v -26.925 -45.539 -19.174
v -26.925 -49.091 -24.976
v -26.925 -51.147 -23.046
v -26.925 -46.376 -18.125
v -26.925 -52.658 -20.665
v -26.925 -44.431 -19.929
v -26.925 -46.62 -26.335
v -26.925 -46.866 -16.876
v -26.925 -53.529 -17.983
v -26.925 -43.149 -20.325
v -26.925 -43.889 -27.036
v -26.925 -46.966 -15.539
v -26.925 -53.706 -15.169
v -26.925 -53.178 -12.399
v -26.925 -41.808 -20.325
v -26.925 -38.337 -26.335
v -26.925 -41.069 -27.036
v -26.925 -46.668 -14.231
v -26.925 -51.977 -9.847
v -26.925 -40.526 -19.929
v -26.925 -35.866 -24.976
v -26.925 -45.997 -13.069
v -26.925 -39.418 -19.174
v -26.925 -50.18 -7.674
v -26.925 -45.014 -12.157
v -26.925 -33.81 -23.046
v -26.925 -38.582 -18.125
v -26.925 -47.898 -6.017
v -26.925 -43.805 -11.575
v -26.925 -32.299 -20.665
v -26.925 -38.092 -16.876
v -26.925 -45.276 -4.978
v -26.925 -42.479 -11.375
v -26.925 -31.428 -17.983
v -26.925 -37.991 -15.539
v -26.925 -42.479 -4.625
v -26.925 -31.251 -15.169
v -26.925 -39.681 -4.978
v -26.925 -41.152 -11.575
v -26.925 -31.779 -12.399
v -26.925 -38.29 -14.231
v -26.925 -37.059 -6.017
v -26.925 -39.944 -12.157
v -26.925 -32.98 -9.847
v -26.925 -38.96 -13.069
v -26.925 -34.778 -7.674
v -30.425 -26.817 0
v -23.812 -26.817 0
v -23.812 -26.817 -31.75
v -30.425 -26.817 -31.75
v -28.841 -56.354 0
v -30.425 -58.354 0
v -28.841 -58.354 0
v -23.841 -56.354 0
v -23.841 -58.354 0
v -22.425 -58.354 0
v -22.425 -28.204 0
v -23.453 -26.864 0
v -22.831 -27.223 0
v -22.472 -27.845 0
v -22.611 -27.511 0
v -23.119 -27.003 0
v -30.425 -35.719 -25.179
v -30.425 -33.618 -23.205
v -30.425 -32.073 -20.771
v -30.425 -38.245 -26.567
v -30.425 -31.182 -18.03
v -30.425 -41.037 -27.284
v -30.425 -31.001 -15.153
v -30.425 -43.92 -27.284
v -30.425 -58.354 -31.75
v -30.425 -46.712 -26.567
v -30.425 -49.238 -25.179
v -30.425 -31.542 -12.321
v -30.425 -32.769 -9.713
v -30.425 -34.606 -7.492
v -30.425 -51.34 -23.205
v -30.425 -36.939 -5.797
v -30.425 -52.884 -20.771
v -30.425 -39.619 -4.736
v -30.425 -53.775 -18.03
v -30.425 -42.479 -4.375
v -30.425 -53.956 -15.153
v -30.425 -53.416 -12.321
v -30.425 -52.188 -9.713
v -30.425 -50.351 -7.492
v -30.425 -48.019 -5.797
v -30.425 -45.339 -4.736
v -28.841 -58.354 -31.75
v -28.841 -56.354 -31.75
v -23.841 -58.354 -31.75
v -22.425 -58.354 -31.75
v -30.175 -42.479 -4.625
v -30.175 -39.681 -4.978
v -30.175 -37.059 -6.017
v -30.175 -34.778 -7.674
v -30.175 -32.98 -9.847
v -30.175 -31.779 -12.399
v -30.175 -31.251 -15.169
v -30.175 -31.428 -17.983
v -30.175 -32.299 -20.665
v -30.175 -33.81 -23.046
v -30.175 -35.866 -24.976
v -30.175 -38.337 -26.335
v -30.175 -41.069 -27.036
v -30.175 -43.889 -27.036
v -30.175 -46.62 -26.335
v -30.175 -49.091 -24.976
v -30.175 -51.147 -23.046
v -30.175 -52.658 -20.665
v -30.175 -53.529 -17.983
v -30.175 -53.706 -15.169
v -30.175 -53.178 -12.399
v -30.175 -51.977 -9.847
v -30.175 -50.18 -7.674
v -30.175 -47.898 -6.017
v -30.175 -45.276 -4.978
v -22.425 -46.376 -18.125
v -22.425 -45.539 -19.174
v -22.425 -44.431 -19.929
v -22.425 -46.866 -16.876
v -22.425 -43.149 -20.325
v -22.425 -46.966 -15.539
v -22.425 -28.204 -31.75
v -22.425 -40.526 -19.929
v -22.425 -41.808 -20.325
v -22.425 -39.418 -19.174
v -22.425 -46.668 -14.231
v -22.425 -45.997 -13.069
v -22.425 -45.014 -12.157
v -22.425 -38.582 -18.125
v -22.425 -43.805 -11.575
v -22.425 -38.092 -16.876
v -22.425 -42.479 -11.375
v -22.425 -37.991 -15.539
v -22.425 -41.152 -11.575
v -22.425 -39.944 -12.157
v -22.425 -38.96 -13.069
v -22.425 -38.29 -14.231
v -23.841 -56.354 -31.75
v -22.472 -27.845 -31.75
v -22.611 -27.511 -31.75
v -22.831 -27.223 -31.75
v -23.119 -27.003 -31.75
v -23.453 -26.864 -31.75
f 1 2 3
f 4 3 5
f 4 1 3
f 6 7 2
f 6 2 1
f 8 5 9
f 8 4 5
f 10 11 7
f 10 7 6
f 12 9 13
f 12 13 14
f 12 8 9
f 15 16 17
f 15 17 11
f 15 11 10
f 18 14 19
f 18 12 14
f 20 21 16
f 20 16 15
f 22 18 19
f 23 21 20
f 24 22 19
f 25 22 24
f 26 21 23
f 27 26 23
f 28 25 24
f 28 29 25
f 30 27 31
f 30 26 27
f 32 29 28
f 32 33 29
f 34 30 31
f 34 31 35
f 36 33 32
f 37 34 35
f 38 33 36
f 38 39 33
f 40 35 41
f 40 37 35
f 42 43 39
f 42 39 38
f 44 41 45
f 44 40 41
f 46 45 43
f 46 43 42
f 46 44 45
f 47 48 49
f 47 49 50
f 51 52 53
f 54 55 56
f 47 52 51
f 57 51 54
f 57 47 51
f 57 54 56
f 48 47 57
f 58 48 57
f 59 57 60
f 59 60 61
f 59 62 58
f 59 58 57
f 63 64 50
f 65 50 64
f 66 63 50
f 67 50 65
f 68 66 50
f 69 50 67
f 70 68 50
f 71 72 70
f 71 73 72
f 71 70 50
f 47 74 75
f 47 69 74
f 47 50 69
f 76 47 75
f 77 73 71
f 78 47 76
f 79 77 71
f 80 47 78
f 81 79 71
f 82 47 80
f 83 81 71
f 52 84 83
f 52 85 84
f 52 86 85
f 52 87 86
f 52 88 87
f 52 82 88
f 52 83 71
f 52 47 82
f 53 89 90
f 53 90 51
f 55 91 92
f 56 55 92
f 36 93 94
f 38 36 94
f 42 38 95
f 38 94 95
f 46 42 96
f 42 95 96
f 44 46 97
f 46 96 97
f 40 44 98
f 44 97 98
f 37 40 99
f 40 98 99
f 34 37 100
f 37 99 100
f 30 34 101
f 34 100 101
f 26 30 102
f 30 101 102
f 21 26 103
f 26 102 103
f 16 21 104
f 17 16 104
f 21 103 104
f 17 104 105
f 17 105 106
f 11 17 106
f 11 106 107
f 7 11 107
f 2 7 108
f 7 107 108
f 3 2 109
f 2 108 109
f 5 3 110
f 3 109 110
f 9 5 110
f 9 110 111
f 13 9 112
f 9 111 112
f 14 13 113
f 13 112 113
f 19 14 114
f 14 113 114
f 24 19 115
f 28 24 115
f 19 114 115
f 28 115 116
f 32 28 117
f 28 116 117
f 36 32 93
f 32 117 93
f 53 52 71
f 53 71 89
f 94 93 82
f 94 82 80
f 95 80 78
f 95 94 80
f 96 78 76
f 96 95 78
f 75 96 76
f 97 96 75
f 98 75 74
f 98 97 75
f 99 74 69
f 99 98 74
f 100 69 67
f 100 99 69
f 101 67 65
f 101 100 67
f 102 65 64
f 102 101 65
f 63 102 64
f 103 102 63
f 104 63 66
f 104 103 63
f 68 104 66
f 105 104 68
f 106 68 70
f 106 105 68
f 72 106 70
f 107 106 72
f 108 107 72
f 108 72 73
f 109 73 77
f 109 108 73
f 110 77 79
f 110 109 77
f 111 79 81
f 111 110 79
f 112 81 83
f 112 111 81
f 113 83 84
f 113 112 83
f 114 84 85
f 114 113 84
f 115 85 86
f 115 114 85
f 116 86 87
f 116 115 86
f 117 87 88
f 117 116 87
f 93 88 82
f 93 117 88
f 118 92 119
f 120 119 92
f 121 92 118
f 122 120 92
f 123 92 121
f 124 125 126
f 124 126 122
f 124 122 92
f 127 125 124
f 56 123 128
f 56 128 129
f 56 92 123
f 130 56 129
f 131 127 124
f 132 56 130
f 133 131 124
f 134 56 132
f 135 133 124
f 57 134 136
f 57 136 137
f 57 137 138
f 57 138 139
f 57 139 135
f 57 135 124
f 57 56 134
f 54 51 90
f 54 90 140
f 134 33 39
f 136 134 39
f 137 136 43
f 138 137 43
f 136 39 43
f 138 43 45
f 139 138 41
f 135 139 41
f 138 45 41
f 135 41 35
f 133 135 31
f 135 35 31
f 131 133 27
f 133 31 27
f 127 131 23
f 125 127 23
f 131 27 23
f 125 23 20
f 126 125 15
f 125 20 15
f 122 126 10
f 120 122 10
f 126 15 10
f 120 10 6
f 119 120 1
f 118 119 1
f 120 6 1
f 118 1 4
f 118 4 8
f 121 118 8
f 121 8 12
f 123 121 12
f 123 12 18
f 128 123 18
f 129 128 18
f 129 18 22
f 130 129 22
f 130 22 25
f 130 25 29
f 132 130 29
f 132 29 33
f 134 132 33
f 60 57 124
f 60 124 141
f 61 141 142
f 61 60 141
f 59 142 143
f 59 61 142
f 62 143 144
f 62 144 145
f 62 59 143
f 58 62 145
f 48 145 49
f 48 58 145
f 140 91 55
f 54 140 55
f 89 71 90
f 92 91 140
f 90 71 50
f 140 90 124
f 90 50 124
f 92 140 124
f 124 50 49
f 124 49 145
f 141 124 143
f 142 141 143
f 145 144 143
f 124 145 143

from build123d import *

# Parameters (mm, degrees)
BOSS_EXTRUDE1_DEPTH = 31.75
SKETCH2_R           = 11.25
SKETCH2_R_2         = 4.5
CUT_EXTRUDE1_DEPTH  = 3.5
CUT_EXTRUDE2_REACH  = 68.912
SKETCH3_R           = 4.5
SKETCH4_W           = 5
SKETCH4_H           = 31.75
CUT_EXTRUDE3_DEPTH  = 2
CHAMFER3_SIZE       = 0.25


with BuildPart() as part:
    # Sketch1 → Boss-Extrude1 (new body)
    with BuildSketch(Plane.XY):
        with BuildLine():
            Line((-22.425, -58.353679699), (-22.425, -28.204472455))
            ThreePointArc((-22.425, -28.204472455), (-22.831389341, -27.223361796), (-23.8125, -26.816972455))
            Line((-23.8125, -26.816972455), (-30.425, -26.816972455))
            Line((-30.425, -26.816972455), (-30.425, -58.353679699))
            Line((-30.425, -58.353679699), (-22.425, -58.353679699))
        make_face()
    extrude(amount=-BOSS_EXTRUDE1_DEPTH)

    # Sketch2 → Cut-Extrude1 (cut)
    with BuildSketch(Plane.ZY.offset(30.425)):
        with Locations((-15.875, -42.478679699)):
            Circle(SKETCH2_R)
        with Locations((-15.875, -42.478679699)):
            Circle(SKETCH2_R_2, mode=Mode.SUBTRACT)
    extrude(amount=-CUT_EXTRUDE1_DEPTH, mode=Mode.SUBTRACT)

    # Sketch3 → Cut-Extrude2 (cut, up to next)
    with BuildSketch(Plane.ZY.offset(30.425), mode=Mode.PRIVATE) as cut_extrude2_sk1:
        with Locations((-15.875, -42.478679699)):
            Circle(SKETCH3_R)
    cut_extrude2_tool1 = extrude(cut_extrude2_sk1.sketch, amount=-CUT_EXTRUDE2_REACH, mode=Mode.PRIVATE) & part.part
    add(cut_extrude2_tool1.solids().sort_by_distance((-30.425, -42.47868, -15.875))[0], mode=Mode.SUBTRACT)

    # Sketch4 → Cut-Extrude3 (cut)
    with BuildSketch(Plane.XZ.offset(58.353679699)):
        with Locations((-26.341152568, -15.875)):
            Rectangle(SKETCH4_W, SKETCH4_H)
    extrude(amount=-CUT_EXTRUDE3_DEPTH, mode=Mode.SUBTRACT)

    # Chamfer3
    chamfer3_edges = [part.edges().sort_by_distance(p)[0] for p in [
        (-30.425, -42.478679699, -27.125),
    ]]
    chamfer(chamfer3_edges, length=CHAMFER3_SIZE)


solid = part.part
